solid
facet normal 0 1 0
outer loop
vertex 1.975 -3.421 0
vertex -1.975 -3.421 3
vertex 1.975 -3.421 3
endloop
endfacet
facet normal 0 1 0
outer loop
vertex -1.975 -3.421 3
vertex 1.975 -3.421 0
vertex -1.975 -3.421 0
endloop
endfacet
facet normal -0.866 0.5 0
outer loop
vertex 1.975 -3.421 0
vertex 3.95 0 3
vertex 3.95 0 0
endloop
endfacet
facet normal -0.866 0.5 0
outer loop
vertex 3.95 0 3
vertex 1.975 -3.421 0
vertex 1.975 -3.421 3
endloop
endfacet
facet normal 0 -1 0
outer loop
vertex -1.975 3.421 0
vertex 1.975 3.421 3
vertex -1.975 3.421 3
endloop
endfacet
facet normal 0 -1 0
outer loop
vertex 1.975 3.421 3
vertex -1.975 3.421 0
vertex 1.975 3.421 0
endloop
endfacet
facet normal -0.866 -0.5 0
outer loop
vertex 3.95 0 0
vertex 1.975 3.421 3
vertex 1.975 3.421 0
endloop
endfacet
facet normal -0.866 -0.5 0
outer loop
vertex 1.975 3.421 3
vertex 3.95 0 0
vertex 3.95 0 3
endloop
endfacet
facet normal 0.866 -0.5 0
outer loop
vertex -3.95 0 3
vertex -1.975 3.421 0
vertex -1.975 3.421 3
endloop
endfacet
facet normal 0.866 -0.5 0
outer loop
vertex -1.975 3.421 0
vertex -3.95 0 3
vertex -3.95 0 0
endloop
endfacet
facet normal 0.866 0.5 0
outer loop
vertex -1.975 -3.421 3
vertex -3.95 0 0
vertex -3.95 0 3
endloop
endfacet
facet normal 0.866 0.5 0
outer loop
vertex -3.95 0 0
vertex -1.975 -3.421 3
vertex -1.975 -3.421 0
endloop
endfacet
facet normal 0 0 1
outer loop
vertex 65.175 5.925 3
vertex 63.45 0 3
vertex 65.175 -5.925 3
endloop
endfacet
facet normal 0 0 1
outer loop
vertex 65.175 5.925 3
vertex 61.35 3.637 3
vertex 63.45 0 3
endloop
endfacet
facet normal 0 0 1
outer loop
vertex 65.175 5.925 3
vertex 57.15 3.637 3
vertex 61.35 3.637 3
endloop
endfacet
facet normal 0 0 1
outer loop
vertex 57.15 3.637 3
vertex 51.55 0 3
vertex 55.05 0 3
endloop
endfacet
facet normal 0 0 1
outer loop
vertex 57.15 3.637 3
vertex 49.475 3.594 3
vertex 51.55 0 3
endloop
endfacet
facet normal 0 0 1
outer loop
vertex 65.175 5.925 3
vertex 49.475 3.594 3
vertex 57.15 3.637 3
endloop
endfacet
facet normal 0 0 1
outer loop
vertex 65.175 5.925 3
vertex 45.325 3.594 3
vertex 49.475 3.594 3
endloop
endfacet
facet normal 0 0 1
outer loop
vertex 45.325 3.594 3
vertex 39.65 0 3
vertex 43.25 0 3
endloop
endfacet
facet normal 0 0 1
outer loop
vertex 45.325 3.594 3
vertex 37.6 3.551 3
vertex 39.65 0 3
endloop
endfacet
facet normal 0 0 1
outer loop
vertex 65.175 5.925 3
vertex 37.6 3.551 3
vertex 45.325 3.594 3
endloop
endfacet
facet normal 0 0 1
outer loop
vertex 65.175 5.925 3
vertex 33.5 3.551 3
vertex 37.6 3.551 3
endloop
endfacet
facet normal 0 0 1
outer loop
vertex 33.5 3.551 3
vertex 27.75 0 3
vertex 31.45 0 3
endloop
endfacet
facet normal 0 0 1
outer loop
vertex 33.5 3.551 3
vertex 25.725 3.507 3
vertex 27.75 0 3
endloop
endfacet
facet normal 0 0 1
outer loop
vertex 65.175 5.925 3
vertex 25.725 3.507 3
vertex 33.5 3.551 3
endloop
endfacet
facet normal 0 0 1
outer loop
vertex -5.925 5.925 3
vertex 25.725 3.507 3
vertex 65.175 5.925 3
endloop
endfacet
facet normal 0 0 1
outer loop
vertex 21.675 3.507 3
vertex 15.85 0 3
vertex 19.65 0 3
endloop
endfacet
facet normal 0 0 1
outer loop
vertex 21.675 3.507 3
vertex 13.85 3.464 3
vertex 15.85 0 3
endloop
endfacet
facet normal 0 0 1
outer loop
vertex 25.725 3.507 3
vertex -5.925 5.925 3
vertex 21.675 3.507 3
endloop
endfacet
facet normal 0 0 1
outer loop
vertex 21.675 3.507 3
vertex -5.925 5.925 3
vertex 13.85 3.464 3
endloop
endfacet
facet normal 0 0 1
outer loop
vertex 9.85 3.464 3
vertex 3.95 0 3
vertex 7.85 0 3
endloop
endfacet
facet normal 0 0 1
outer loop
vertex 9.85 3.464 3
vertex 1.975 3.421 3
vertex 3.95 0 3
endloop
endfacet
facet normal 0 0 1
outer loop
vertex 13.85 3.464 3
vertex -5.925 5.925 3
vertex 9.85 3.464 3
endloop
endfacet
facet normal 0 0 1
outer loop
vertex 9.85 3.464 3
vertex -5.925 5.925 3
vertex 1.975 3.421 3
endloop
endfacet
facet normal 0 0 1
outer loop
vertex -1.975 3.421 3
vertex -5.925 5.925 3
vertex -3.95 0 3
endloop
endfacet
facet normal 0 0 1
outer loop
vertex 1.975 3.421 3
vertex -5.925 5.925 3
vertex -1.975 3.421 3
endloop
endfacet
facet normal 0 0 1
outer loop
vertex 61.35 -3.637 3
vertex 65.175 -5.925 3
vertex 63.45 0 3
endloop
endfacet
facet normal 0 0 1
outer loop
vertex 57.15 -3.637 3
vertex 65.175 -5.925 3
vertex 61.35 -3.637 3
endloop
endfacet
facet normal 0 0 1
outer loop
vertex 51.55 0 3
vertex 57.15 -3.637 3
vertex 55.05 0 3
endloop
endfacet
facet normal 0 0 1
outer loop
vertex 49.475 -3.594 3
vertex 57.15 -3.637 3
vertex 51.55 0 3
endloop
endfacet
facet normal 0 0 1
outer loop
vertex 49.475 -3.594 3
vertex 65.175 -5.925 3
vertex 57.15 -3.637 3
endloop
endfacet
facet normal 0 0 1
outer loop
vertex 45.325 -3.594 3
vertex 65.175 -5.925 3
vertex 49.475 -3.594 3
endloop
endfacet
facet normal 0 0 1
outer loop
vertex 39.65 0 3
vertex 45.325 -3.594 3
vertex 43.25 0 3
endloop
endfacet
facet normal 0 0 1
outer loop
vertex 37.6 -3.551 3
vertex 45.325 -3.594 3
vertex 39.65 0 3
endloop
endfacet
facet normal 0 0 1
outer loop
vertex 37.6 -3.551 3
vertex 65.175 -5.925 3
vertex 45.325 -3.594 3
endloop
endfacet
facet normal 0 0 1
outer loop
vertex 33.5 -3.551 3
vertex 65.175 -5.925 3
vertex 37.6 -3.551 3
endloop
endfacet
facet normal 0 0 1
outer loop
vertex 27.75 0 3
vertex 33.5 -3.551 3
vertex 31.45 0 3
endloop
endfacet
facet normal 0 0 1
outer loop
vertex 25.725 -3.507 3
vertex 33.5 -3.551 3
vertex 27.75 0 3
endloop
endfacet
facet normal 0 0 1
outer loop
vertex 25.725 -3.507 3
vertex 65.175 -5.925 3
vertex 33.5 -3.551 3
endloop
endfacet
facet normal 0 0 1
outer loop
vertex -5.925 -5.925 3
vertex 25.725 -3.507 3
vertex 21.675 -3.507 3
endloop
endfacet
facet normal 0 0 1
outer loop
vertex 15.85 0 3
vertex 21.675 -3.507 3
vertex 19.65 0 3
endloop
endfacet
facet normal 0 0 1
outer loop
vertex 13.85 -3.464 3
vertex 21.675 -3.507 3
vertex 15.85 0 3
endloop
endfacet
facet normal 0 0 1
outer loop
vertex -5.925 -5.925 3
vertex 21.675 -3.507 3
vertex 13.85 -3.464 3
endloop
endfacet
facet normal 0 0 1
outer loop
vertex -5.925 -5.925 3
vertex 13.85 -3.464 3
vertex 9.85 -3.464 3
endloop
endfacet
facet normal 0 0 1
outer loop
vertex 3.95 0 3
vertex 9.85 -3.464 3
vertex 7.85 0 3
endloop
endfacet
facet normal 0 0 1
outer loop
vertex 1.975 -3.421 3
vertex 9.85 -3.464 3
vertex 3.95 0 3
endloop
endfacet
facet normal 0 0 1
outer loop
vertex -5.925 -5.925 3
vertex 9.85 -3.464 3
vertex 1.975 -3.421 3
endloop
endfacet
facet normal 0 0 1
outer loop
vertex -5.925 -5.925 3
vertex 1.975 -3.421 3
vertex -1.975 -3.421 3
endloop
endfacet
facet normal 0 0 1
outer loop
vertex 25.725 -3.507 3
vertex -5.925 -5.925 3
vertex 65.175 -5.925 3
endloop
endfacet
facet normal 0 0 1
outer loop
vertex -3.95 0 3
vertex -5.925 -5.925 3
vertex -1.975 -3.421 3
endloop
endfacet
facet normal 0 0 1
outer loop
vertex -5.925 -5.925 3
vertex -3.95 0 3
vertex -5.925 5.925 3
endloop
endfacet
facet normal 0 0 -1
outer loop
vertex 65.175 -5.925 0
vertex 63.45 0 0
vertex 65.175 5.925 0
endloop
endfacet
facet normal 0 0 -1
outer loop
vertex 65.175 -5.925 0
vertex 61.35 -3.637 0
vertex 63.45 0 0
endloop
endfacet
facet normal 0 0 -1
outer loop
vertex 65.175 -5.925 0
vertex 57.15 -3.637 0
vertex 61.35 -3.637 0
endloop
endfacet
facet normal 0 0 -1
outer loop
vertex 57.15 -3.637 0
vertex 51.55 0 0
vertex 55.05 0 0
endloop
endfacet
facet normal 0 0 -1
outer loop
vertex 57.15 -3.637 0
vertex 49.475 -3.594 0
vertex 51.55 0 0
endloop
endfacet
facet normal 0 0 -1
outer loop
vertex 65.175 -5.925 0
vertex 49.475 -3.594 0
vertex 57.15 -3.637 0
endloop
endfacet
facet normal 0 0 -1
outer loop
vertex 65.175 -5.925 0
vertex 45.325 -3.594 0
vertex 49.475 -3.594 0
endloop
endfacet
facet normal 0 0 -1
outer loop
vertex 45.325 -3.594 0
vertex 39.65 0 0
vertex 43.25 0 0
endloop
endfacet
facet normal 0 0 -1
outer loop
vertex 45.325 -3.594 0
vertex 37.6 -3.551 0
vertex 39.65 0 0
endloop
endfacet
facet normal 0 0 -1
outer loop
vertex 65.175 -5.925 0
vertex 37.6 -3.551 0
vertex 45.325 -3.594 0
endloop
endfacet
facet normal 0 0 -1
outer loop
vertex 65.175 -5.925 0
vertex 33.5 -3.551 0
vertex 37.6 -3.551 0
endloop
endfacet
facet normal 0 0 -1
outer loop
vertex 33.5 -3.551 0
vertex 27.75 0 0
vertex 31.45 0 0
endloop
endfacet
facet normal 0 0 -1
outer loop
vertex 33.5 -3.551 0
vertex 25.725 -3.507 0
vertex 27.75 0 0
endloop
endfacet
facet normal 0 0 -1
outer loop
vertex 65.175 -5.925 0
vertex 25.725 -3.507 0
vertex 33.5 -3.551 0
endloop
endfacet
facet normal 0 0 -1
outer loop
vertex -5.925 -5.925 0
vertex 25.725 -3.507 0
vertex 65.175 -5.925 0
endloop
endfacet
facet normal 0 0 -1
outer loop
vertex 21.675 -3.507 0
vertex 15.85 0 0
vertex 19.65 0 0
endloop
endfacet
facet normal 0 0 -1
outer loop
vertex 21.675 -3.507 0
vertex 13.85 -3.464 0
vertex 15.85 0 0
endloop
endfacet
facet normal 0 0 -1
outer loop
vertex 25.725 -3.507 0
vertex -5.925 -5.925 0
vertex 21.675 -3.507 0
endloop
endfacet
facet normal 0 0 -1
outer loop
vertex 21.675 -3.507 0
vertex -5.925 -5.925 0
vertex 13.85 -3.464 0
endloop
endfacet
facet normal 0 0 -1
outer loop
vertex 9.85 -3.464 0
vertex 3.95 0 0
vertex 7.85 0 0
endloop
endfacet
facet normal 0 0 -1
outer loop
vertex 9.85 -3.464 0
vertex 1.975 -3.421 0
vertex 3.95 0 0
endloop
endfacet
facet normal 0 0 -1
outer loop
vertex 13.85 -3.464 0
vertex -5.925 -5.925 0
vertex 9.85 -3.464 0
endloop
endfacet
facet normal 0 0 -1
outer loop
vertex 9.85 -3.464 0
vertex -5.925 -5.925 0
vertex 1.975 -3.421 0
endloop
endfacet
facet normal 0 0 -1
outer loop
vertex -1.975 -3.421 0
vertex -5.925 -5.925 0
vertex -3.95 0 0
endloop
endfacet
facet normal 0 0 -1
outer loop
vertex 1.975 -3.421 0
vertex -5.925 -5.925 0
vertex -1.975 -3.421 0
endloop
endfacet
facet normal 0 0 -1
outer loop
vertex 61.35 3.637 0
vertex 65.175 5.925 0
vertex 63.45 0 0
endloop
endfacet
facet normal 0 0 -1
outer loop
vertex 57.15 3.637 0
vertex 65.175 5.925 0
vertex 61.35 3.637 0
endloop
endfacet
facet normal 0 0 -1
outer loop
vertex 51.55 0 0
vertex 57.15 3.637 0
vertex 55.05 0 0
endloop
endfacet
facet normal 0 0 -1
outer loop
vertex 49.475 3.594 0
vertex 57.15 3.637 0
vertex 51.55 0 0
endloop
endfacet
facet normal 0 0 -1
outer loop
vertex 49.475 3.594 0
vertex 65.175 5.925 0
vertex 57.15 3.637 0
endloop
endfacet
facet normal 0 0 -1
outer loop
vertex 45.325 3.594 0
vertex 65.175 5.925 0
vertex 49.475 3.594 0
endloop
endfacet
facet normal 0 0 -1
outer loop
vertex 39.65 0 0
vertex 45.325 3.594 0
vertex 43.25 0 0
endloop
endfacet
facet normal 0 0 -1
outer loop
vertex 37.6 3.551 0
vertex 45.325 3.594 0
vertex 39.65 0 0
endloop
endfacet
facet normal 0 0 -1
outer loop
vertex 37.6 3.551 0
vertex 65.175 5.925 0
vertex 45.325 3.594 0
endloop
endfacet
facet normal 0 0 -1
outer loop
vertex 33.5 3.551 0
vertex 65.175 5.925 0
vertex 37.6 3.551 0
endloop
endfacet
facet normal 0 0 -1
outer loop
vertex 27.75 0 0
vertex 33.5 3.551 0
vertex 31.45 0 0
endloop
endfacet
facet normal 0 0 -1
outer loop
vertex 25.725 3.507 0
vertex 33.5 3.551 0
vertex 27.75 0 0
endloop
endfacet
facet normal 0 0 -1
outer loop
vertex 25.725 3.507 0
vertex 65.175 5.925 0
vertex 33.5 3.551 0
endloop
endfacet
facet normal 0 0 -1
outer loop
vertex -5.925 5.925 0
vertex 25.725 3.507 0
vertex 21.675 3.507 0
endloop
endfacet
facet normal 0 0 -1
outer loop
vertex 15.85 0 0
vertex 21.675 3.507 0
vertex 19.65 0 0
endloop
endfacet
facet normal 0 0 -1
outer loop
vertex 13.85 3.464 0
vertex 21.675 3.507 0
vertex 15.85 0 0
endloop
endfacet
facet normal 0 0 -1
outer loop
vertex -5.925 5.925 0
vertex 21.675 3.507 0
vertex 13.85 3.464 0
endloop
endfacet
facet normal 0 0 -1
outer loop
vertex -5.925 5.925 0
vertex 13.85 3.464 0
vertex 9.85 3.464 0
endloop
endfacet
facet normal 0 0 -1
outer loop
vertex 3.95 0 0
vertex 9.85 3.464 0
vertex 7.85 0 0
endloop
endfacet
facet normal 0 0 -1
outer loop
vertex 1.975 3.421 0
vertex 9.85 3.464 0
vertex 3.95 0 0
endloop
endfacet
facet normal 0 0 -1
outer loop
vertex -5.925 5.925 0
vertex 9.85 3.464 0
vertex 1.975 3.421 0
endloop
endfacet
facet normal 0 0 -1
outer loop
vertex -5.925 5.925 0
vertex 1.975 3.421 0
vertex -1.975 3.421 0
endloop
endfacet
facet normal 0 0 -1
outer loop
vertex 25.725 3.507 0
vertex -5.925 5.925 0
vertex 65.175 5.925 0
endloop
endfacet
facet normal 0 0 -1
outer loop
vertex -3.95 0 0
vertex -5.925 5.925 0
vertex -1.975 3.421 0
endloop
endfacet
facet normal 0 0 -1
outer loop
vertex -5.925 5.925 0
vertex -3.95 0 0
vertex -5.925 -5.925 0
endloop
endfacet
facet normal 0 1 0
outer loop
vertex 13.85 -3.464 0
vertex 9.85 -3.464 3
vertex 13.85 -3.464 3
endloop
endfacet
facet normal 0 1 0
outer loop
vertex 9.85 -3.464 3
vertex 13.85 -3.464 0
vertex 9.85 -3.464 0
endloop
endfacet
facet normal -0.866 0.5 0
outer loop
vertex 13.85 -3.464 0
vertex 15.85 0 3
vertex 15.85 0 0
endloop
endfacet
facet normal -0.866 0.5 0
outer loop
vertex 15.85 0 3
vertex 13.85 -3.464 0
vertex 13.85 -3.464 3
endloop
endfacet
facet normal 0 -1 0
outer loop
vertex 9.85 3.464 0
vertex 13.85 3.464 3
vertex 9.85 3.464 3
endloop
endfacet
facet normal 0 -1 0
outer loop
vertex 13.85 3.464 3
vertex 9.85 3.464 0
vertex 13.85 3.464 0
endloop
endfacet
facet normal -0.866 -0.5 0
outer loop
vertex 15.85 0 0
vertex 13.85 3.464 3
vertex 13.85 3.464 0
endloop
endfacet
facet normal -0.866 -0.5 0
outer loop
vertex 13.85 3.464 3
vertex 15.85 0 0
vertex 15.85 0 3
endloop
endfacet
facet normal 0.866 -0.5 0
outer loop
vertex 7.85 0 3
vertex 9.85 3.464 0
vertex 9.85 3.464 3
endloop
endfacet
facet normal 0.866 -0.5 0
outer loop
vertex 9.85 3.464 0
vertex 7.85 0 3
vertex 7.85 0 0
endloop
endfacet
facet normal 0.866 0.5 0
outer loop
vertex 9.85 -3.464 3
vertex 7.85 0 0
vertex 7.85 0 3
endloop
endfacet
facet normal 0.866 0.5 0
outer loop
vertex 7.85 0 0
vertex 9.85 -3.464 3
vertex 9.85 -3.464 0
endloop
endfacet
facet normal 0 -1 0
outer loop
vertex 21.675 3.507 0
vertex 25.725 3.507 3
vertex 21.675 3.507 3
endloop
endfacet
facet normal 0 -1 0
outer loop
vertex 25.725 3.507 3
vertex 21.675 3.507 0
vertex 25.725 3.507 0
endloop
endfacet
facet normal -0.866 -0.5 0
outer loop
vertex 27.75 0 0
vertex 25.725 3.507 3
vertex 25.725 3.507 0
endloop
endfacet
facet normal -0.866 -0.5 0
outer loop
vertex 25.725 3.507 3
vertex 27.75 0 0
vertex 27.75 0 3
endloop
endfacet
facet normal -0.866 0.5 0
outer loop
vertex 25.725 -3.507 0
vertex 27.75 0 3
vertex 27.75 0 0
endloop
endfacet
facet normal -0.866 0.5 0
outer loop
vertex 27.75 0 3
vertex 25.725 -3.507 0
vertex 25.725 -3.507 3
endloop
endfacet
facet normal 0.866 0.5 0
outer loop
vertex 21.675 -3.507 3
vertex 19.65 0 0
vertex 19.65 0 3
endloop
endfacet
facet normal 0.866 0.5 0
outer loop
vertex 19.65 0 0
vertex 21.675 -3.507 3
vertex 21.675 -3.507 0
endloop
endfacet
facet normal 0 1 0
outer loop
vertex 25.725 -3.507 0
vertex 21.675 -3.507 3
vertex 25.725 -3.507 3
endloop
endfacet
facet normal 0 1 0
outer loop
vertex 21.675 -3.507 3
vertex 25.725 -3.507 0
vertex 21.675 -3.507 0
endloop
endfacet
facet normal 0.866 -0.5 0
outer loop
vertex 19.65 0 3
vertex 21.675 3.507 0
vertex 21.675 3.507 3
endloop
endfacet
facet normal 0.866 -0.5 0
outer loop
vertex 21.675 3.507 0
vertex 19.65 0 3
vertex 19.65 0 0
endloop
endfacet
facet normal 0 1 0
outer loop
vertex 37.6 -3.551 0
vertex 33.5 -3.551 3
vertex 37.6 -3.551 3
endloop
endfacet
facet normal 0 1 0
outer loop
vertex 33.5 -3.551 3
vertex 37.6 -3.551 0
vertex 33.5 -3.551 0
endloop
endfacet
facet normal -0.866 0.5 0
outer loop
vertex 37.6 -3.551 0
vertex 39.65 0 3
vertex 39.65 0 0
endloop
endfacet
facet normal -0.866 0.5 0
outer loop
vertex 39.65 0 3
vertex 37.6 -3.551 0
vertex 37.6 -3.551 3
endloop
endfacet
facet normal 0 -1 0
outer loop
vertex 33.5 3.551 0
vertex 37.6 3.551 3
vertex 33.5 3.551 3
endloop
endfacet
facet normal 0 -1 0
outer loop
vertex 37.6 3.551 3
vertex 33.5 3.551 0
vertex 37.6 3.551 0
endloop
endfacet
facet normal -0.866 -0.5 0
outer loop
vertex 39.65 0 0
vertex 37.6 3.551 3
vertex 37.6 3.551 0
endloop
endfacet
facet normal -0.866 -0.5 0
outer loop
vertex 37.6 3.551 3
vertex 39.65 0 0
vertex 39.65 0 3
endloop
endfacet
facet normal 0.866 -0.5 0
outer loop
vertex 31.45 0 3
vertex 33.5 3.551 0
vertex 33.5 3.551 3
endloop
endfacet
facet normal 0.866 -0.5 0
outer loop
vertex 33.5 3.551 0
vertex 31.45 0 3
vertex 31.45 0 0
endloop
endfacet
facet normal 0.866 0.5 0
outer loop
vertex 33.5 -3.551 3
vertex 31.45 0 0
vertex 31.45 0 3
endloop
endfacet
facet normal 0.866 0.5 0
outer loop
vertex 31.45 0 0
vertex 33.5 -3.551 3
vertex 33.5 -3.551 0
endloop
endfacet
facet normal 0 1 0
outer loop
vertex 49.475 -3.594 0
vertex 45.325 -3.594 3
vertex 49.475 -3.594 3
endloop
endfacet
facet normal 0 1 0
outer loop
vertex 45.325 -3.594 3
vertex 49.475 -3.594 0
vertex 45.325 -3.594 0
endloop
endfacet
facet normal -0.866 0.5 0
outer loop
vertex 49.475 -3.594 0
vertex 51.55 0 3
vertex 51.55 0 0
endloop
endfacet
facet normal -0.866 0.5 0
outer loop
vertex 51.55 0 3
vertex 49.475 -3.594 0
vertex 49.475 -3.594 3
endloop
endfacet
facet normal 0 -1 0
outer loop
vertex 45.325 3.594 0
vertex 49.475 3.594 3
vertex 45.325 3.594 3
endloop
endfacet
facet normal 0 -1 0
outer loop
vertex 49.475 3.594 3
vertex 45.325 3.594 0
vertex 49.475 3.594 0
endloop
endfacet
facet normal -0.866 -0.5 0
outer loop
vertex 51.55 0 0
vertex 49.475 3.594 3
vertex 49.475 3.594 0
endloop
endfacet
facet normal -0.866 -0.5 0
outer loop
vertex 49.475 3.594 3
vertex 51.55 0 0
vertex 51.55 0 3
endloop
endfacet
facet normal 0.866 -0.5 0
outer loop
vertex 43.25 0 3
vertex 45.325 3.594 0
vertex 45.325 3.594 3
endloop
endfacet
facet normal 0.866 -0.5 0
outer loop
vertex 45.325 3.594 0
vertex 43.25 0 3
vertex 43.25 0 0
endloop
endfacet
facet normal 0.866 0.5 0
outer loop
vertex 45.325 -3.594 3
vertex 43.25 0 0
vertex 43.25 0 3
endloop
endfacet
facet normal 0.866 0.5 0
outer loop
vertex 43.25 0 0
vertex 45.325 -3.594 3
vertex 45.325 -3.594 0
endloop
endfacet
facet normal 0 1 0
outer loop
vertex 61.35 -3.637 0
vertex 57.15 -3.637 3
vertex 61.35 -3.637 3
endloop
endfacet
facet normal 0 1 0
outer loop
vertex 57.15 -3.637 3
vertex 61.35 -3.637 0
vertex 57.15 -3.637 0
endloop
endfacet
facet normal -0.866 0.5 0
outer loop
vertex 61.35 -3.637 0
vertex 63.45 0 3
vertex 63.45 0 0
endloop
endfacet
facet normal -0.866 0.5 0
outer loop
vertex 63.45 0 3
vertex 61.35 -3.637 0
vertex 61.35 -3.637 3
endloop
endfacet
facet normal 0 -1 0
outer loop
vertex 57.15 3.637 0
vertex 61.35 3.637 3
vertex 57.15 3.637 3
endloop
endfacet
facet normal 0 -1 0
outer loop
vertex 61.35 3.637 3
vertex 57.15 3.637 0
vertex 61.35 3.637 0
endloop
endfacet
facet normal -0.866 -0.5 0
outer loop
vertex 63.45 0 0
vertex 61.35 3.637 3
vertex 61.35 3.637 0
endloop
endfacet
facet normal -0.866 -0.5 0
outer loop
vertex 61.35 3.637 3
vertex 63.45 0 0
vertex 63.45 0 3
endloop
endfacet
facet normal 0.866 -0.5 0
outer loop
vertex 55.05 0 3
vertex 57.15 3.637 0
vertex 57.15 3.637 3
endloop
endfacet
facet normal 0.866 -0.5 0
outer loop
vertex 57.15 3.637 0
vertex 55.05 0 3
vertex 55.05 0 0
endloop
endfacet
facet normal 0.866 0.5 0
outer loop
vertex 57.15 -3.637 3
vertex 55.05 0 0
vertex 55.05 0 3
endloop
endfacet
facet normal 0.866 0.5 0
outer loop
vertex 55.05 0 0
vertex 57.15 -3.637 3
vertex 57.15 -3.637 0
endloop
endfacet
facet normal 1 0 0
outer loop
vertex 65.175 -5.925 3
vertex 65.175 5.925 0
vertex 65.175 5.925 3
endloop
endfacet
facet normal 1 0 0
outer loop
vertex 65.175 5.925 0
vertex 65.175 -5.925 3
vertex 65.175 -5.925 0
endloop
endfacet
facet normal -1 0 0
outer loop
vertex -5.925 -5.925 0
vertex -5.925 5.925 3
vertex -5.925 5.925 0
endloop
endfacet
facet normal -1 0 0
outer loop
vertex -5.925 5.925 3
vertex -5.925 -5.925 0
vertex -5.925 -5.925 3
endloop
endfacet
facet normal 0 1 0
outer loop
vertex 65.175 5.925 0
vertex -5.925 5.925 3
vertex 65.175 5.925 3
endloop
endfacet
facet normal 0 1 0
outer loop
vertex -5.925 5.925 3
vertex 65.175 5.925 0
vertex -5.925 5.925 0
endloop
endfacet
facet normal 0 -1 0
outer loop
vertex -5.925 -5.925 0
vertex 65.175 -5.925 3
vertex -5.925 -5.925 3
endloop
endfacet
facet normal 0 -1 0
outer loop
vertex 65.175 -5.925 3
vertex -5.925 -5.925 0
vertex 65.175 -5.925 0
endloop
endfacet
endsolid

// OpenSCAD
d0 = 7.9;
step = 0.1;
count = 5;

difference()
{
	translate([-d0*1.5/2,-d0*1.5/2,0])
	cube([(count+1)*1.5*d0,1.5*d0,3]);
	
	for(i = [0:count])
	{
		echo(d0 + i * step);
		translate([d0*1.5*i,0,0])
		cylinder(d=d0 + i * step,h=3,$fn=6);
	}
}
